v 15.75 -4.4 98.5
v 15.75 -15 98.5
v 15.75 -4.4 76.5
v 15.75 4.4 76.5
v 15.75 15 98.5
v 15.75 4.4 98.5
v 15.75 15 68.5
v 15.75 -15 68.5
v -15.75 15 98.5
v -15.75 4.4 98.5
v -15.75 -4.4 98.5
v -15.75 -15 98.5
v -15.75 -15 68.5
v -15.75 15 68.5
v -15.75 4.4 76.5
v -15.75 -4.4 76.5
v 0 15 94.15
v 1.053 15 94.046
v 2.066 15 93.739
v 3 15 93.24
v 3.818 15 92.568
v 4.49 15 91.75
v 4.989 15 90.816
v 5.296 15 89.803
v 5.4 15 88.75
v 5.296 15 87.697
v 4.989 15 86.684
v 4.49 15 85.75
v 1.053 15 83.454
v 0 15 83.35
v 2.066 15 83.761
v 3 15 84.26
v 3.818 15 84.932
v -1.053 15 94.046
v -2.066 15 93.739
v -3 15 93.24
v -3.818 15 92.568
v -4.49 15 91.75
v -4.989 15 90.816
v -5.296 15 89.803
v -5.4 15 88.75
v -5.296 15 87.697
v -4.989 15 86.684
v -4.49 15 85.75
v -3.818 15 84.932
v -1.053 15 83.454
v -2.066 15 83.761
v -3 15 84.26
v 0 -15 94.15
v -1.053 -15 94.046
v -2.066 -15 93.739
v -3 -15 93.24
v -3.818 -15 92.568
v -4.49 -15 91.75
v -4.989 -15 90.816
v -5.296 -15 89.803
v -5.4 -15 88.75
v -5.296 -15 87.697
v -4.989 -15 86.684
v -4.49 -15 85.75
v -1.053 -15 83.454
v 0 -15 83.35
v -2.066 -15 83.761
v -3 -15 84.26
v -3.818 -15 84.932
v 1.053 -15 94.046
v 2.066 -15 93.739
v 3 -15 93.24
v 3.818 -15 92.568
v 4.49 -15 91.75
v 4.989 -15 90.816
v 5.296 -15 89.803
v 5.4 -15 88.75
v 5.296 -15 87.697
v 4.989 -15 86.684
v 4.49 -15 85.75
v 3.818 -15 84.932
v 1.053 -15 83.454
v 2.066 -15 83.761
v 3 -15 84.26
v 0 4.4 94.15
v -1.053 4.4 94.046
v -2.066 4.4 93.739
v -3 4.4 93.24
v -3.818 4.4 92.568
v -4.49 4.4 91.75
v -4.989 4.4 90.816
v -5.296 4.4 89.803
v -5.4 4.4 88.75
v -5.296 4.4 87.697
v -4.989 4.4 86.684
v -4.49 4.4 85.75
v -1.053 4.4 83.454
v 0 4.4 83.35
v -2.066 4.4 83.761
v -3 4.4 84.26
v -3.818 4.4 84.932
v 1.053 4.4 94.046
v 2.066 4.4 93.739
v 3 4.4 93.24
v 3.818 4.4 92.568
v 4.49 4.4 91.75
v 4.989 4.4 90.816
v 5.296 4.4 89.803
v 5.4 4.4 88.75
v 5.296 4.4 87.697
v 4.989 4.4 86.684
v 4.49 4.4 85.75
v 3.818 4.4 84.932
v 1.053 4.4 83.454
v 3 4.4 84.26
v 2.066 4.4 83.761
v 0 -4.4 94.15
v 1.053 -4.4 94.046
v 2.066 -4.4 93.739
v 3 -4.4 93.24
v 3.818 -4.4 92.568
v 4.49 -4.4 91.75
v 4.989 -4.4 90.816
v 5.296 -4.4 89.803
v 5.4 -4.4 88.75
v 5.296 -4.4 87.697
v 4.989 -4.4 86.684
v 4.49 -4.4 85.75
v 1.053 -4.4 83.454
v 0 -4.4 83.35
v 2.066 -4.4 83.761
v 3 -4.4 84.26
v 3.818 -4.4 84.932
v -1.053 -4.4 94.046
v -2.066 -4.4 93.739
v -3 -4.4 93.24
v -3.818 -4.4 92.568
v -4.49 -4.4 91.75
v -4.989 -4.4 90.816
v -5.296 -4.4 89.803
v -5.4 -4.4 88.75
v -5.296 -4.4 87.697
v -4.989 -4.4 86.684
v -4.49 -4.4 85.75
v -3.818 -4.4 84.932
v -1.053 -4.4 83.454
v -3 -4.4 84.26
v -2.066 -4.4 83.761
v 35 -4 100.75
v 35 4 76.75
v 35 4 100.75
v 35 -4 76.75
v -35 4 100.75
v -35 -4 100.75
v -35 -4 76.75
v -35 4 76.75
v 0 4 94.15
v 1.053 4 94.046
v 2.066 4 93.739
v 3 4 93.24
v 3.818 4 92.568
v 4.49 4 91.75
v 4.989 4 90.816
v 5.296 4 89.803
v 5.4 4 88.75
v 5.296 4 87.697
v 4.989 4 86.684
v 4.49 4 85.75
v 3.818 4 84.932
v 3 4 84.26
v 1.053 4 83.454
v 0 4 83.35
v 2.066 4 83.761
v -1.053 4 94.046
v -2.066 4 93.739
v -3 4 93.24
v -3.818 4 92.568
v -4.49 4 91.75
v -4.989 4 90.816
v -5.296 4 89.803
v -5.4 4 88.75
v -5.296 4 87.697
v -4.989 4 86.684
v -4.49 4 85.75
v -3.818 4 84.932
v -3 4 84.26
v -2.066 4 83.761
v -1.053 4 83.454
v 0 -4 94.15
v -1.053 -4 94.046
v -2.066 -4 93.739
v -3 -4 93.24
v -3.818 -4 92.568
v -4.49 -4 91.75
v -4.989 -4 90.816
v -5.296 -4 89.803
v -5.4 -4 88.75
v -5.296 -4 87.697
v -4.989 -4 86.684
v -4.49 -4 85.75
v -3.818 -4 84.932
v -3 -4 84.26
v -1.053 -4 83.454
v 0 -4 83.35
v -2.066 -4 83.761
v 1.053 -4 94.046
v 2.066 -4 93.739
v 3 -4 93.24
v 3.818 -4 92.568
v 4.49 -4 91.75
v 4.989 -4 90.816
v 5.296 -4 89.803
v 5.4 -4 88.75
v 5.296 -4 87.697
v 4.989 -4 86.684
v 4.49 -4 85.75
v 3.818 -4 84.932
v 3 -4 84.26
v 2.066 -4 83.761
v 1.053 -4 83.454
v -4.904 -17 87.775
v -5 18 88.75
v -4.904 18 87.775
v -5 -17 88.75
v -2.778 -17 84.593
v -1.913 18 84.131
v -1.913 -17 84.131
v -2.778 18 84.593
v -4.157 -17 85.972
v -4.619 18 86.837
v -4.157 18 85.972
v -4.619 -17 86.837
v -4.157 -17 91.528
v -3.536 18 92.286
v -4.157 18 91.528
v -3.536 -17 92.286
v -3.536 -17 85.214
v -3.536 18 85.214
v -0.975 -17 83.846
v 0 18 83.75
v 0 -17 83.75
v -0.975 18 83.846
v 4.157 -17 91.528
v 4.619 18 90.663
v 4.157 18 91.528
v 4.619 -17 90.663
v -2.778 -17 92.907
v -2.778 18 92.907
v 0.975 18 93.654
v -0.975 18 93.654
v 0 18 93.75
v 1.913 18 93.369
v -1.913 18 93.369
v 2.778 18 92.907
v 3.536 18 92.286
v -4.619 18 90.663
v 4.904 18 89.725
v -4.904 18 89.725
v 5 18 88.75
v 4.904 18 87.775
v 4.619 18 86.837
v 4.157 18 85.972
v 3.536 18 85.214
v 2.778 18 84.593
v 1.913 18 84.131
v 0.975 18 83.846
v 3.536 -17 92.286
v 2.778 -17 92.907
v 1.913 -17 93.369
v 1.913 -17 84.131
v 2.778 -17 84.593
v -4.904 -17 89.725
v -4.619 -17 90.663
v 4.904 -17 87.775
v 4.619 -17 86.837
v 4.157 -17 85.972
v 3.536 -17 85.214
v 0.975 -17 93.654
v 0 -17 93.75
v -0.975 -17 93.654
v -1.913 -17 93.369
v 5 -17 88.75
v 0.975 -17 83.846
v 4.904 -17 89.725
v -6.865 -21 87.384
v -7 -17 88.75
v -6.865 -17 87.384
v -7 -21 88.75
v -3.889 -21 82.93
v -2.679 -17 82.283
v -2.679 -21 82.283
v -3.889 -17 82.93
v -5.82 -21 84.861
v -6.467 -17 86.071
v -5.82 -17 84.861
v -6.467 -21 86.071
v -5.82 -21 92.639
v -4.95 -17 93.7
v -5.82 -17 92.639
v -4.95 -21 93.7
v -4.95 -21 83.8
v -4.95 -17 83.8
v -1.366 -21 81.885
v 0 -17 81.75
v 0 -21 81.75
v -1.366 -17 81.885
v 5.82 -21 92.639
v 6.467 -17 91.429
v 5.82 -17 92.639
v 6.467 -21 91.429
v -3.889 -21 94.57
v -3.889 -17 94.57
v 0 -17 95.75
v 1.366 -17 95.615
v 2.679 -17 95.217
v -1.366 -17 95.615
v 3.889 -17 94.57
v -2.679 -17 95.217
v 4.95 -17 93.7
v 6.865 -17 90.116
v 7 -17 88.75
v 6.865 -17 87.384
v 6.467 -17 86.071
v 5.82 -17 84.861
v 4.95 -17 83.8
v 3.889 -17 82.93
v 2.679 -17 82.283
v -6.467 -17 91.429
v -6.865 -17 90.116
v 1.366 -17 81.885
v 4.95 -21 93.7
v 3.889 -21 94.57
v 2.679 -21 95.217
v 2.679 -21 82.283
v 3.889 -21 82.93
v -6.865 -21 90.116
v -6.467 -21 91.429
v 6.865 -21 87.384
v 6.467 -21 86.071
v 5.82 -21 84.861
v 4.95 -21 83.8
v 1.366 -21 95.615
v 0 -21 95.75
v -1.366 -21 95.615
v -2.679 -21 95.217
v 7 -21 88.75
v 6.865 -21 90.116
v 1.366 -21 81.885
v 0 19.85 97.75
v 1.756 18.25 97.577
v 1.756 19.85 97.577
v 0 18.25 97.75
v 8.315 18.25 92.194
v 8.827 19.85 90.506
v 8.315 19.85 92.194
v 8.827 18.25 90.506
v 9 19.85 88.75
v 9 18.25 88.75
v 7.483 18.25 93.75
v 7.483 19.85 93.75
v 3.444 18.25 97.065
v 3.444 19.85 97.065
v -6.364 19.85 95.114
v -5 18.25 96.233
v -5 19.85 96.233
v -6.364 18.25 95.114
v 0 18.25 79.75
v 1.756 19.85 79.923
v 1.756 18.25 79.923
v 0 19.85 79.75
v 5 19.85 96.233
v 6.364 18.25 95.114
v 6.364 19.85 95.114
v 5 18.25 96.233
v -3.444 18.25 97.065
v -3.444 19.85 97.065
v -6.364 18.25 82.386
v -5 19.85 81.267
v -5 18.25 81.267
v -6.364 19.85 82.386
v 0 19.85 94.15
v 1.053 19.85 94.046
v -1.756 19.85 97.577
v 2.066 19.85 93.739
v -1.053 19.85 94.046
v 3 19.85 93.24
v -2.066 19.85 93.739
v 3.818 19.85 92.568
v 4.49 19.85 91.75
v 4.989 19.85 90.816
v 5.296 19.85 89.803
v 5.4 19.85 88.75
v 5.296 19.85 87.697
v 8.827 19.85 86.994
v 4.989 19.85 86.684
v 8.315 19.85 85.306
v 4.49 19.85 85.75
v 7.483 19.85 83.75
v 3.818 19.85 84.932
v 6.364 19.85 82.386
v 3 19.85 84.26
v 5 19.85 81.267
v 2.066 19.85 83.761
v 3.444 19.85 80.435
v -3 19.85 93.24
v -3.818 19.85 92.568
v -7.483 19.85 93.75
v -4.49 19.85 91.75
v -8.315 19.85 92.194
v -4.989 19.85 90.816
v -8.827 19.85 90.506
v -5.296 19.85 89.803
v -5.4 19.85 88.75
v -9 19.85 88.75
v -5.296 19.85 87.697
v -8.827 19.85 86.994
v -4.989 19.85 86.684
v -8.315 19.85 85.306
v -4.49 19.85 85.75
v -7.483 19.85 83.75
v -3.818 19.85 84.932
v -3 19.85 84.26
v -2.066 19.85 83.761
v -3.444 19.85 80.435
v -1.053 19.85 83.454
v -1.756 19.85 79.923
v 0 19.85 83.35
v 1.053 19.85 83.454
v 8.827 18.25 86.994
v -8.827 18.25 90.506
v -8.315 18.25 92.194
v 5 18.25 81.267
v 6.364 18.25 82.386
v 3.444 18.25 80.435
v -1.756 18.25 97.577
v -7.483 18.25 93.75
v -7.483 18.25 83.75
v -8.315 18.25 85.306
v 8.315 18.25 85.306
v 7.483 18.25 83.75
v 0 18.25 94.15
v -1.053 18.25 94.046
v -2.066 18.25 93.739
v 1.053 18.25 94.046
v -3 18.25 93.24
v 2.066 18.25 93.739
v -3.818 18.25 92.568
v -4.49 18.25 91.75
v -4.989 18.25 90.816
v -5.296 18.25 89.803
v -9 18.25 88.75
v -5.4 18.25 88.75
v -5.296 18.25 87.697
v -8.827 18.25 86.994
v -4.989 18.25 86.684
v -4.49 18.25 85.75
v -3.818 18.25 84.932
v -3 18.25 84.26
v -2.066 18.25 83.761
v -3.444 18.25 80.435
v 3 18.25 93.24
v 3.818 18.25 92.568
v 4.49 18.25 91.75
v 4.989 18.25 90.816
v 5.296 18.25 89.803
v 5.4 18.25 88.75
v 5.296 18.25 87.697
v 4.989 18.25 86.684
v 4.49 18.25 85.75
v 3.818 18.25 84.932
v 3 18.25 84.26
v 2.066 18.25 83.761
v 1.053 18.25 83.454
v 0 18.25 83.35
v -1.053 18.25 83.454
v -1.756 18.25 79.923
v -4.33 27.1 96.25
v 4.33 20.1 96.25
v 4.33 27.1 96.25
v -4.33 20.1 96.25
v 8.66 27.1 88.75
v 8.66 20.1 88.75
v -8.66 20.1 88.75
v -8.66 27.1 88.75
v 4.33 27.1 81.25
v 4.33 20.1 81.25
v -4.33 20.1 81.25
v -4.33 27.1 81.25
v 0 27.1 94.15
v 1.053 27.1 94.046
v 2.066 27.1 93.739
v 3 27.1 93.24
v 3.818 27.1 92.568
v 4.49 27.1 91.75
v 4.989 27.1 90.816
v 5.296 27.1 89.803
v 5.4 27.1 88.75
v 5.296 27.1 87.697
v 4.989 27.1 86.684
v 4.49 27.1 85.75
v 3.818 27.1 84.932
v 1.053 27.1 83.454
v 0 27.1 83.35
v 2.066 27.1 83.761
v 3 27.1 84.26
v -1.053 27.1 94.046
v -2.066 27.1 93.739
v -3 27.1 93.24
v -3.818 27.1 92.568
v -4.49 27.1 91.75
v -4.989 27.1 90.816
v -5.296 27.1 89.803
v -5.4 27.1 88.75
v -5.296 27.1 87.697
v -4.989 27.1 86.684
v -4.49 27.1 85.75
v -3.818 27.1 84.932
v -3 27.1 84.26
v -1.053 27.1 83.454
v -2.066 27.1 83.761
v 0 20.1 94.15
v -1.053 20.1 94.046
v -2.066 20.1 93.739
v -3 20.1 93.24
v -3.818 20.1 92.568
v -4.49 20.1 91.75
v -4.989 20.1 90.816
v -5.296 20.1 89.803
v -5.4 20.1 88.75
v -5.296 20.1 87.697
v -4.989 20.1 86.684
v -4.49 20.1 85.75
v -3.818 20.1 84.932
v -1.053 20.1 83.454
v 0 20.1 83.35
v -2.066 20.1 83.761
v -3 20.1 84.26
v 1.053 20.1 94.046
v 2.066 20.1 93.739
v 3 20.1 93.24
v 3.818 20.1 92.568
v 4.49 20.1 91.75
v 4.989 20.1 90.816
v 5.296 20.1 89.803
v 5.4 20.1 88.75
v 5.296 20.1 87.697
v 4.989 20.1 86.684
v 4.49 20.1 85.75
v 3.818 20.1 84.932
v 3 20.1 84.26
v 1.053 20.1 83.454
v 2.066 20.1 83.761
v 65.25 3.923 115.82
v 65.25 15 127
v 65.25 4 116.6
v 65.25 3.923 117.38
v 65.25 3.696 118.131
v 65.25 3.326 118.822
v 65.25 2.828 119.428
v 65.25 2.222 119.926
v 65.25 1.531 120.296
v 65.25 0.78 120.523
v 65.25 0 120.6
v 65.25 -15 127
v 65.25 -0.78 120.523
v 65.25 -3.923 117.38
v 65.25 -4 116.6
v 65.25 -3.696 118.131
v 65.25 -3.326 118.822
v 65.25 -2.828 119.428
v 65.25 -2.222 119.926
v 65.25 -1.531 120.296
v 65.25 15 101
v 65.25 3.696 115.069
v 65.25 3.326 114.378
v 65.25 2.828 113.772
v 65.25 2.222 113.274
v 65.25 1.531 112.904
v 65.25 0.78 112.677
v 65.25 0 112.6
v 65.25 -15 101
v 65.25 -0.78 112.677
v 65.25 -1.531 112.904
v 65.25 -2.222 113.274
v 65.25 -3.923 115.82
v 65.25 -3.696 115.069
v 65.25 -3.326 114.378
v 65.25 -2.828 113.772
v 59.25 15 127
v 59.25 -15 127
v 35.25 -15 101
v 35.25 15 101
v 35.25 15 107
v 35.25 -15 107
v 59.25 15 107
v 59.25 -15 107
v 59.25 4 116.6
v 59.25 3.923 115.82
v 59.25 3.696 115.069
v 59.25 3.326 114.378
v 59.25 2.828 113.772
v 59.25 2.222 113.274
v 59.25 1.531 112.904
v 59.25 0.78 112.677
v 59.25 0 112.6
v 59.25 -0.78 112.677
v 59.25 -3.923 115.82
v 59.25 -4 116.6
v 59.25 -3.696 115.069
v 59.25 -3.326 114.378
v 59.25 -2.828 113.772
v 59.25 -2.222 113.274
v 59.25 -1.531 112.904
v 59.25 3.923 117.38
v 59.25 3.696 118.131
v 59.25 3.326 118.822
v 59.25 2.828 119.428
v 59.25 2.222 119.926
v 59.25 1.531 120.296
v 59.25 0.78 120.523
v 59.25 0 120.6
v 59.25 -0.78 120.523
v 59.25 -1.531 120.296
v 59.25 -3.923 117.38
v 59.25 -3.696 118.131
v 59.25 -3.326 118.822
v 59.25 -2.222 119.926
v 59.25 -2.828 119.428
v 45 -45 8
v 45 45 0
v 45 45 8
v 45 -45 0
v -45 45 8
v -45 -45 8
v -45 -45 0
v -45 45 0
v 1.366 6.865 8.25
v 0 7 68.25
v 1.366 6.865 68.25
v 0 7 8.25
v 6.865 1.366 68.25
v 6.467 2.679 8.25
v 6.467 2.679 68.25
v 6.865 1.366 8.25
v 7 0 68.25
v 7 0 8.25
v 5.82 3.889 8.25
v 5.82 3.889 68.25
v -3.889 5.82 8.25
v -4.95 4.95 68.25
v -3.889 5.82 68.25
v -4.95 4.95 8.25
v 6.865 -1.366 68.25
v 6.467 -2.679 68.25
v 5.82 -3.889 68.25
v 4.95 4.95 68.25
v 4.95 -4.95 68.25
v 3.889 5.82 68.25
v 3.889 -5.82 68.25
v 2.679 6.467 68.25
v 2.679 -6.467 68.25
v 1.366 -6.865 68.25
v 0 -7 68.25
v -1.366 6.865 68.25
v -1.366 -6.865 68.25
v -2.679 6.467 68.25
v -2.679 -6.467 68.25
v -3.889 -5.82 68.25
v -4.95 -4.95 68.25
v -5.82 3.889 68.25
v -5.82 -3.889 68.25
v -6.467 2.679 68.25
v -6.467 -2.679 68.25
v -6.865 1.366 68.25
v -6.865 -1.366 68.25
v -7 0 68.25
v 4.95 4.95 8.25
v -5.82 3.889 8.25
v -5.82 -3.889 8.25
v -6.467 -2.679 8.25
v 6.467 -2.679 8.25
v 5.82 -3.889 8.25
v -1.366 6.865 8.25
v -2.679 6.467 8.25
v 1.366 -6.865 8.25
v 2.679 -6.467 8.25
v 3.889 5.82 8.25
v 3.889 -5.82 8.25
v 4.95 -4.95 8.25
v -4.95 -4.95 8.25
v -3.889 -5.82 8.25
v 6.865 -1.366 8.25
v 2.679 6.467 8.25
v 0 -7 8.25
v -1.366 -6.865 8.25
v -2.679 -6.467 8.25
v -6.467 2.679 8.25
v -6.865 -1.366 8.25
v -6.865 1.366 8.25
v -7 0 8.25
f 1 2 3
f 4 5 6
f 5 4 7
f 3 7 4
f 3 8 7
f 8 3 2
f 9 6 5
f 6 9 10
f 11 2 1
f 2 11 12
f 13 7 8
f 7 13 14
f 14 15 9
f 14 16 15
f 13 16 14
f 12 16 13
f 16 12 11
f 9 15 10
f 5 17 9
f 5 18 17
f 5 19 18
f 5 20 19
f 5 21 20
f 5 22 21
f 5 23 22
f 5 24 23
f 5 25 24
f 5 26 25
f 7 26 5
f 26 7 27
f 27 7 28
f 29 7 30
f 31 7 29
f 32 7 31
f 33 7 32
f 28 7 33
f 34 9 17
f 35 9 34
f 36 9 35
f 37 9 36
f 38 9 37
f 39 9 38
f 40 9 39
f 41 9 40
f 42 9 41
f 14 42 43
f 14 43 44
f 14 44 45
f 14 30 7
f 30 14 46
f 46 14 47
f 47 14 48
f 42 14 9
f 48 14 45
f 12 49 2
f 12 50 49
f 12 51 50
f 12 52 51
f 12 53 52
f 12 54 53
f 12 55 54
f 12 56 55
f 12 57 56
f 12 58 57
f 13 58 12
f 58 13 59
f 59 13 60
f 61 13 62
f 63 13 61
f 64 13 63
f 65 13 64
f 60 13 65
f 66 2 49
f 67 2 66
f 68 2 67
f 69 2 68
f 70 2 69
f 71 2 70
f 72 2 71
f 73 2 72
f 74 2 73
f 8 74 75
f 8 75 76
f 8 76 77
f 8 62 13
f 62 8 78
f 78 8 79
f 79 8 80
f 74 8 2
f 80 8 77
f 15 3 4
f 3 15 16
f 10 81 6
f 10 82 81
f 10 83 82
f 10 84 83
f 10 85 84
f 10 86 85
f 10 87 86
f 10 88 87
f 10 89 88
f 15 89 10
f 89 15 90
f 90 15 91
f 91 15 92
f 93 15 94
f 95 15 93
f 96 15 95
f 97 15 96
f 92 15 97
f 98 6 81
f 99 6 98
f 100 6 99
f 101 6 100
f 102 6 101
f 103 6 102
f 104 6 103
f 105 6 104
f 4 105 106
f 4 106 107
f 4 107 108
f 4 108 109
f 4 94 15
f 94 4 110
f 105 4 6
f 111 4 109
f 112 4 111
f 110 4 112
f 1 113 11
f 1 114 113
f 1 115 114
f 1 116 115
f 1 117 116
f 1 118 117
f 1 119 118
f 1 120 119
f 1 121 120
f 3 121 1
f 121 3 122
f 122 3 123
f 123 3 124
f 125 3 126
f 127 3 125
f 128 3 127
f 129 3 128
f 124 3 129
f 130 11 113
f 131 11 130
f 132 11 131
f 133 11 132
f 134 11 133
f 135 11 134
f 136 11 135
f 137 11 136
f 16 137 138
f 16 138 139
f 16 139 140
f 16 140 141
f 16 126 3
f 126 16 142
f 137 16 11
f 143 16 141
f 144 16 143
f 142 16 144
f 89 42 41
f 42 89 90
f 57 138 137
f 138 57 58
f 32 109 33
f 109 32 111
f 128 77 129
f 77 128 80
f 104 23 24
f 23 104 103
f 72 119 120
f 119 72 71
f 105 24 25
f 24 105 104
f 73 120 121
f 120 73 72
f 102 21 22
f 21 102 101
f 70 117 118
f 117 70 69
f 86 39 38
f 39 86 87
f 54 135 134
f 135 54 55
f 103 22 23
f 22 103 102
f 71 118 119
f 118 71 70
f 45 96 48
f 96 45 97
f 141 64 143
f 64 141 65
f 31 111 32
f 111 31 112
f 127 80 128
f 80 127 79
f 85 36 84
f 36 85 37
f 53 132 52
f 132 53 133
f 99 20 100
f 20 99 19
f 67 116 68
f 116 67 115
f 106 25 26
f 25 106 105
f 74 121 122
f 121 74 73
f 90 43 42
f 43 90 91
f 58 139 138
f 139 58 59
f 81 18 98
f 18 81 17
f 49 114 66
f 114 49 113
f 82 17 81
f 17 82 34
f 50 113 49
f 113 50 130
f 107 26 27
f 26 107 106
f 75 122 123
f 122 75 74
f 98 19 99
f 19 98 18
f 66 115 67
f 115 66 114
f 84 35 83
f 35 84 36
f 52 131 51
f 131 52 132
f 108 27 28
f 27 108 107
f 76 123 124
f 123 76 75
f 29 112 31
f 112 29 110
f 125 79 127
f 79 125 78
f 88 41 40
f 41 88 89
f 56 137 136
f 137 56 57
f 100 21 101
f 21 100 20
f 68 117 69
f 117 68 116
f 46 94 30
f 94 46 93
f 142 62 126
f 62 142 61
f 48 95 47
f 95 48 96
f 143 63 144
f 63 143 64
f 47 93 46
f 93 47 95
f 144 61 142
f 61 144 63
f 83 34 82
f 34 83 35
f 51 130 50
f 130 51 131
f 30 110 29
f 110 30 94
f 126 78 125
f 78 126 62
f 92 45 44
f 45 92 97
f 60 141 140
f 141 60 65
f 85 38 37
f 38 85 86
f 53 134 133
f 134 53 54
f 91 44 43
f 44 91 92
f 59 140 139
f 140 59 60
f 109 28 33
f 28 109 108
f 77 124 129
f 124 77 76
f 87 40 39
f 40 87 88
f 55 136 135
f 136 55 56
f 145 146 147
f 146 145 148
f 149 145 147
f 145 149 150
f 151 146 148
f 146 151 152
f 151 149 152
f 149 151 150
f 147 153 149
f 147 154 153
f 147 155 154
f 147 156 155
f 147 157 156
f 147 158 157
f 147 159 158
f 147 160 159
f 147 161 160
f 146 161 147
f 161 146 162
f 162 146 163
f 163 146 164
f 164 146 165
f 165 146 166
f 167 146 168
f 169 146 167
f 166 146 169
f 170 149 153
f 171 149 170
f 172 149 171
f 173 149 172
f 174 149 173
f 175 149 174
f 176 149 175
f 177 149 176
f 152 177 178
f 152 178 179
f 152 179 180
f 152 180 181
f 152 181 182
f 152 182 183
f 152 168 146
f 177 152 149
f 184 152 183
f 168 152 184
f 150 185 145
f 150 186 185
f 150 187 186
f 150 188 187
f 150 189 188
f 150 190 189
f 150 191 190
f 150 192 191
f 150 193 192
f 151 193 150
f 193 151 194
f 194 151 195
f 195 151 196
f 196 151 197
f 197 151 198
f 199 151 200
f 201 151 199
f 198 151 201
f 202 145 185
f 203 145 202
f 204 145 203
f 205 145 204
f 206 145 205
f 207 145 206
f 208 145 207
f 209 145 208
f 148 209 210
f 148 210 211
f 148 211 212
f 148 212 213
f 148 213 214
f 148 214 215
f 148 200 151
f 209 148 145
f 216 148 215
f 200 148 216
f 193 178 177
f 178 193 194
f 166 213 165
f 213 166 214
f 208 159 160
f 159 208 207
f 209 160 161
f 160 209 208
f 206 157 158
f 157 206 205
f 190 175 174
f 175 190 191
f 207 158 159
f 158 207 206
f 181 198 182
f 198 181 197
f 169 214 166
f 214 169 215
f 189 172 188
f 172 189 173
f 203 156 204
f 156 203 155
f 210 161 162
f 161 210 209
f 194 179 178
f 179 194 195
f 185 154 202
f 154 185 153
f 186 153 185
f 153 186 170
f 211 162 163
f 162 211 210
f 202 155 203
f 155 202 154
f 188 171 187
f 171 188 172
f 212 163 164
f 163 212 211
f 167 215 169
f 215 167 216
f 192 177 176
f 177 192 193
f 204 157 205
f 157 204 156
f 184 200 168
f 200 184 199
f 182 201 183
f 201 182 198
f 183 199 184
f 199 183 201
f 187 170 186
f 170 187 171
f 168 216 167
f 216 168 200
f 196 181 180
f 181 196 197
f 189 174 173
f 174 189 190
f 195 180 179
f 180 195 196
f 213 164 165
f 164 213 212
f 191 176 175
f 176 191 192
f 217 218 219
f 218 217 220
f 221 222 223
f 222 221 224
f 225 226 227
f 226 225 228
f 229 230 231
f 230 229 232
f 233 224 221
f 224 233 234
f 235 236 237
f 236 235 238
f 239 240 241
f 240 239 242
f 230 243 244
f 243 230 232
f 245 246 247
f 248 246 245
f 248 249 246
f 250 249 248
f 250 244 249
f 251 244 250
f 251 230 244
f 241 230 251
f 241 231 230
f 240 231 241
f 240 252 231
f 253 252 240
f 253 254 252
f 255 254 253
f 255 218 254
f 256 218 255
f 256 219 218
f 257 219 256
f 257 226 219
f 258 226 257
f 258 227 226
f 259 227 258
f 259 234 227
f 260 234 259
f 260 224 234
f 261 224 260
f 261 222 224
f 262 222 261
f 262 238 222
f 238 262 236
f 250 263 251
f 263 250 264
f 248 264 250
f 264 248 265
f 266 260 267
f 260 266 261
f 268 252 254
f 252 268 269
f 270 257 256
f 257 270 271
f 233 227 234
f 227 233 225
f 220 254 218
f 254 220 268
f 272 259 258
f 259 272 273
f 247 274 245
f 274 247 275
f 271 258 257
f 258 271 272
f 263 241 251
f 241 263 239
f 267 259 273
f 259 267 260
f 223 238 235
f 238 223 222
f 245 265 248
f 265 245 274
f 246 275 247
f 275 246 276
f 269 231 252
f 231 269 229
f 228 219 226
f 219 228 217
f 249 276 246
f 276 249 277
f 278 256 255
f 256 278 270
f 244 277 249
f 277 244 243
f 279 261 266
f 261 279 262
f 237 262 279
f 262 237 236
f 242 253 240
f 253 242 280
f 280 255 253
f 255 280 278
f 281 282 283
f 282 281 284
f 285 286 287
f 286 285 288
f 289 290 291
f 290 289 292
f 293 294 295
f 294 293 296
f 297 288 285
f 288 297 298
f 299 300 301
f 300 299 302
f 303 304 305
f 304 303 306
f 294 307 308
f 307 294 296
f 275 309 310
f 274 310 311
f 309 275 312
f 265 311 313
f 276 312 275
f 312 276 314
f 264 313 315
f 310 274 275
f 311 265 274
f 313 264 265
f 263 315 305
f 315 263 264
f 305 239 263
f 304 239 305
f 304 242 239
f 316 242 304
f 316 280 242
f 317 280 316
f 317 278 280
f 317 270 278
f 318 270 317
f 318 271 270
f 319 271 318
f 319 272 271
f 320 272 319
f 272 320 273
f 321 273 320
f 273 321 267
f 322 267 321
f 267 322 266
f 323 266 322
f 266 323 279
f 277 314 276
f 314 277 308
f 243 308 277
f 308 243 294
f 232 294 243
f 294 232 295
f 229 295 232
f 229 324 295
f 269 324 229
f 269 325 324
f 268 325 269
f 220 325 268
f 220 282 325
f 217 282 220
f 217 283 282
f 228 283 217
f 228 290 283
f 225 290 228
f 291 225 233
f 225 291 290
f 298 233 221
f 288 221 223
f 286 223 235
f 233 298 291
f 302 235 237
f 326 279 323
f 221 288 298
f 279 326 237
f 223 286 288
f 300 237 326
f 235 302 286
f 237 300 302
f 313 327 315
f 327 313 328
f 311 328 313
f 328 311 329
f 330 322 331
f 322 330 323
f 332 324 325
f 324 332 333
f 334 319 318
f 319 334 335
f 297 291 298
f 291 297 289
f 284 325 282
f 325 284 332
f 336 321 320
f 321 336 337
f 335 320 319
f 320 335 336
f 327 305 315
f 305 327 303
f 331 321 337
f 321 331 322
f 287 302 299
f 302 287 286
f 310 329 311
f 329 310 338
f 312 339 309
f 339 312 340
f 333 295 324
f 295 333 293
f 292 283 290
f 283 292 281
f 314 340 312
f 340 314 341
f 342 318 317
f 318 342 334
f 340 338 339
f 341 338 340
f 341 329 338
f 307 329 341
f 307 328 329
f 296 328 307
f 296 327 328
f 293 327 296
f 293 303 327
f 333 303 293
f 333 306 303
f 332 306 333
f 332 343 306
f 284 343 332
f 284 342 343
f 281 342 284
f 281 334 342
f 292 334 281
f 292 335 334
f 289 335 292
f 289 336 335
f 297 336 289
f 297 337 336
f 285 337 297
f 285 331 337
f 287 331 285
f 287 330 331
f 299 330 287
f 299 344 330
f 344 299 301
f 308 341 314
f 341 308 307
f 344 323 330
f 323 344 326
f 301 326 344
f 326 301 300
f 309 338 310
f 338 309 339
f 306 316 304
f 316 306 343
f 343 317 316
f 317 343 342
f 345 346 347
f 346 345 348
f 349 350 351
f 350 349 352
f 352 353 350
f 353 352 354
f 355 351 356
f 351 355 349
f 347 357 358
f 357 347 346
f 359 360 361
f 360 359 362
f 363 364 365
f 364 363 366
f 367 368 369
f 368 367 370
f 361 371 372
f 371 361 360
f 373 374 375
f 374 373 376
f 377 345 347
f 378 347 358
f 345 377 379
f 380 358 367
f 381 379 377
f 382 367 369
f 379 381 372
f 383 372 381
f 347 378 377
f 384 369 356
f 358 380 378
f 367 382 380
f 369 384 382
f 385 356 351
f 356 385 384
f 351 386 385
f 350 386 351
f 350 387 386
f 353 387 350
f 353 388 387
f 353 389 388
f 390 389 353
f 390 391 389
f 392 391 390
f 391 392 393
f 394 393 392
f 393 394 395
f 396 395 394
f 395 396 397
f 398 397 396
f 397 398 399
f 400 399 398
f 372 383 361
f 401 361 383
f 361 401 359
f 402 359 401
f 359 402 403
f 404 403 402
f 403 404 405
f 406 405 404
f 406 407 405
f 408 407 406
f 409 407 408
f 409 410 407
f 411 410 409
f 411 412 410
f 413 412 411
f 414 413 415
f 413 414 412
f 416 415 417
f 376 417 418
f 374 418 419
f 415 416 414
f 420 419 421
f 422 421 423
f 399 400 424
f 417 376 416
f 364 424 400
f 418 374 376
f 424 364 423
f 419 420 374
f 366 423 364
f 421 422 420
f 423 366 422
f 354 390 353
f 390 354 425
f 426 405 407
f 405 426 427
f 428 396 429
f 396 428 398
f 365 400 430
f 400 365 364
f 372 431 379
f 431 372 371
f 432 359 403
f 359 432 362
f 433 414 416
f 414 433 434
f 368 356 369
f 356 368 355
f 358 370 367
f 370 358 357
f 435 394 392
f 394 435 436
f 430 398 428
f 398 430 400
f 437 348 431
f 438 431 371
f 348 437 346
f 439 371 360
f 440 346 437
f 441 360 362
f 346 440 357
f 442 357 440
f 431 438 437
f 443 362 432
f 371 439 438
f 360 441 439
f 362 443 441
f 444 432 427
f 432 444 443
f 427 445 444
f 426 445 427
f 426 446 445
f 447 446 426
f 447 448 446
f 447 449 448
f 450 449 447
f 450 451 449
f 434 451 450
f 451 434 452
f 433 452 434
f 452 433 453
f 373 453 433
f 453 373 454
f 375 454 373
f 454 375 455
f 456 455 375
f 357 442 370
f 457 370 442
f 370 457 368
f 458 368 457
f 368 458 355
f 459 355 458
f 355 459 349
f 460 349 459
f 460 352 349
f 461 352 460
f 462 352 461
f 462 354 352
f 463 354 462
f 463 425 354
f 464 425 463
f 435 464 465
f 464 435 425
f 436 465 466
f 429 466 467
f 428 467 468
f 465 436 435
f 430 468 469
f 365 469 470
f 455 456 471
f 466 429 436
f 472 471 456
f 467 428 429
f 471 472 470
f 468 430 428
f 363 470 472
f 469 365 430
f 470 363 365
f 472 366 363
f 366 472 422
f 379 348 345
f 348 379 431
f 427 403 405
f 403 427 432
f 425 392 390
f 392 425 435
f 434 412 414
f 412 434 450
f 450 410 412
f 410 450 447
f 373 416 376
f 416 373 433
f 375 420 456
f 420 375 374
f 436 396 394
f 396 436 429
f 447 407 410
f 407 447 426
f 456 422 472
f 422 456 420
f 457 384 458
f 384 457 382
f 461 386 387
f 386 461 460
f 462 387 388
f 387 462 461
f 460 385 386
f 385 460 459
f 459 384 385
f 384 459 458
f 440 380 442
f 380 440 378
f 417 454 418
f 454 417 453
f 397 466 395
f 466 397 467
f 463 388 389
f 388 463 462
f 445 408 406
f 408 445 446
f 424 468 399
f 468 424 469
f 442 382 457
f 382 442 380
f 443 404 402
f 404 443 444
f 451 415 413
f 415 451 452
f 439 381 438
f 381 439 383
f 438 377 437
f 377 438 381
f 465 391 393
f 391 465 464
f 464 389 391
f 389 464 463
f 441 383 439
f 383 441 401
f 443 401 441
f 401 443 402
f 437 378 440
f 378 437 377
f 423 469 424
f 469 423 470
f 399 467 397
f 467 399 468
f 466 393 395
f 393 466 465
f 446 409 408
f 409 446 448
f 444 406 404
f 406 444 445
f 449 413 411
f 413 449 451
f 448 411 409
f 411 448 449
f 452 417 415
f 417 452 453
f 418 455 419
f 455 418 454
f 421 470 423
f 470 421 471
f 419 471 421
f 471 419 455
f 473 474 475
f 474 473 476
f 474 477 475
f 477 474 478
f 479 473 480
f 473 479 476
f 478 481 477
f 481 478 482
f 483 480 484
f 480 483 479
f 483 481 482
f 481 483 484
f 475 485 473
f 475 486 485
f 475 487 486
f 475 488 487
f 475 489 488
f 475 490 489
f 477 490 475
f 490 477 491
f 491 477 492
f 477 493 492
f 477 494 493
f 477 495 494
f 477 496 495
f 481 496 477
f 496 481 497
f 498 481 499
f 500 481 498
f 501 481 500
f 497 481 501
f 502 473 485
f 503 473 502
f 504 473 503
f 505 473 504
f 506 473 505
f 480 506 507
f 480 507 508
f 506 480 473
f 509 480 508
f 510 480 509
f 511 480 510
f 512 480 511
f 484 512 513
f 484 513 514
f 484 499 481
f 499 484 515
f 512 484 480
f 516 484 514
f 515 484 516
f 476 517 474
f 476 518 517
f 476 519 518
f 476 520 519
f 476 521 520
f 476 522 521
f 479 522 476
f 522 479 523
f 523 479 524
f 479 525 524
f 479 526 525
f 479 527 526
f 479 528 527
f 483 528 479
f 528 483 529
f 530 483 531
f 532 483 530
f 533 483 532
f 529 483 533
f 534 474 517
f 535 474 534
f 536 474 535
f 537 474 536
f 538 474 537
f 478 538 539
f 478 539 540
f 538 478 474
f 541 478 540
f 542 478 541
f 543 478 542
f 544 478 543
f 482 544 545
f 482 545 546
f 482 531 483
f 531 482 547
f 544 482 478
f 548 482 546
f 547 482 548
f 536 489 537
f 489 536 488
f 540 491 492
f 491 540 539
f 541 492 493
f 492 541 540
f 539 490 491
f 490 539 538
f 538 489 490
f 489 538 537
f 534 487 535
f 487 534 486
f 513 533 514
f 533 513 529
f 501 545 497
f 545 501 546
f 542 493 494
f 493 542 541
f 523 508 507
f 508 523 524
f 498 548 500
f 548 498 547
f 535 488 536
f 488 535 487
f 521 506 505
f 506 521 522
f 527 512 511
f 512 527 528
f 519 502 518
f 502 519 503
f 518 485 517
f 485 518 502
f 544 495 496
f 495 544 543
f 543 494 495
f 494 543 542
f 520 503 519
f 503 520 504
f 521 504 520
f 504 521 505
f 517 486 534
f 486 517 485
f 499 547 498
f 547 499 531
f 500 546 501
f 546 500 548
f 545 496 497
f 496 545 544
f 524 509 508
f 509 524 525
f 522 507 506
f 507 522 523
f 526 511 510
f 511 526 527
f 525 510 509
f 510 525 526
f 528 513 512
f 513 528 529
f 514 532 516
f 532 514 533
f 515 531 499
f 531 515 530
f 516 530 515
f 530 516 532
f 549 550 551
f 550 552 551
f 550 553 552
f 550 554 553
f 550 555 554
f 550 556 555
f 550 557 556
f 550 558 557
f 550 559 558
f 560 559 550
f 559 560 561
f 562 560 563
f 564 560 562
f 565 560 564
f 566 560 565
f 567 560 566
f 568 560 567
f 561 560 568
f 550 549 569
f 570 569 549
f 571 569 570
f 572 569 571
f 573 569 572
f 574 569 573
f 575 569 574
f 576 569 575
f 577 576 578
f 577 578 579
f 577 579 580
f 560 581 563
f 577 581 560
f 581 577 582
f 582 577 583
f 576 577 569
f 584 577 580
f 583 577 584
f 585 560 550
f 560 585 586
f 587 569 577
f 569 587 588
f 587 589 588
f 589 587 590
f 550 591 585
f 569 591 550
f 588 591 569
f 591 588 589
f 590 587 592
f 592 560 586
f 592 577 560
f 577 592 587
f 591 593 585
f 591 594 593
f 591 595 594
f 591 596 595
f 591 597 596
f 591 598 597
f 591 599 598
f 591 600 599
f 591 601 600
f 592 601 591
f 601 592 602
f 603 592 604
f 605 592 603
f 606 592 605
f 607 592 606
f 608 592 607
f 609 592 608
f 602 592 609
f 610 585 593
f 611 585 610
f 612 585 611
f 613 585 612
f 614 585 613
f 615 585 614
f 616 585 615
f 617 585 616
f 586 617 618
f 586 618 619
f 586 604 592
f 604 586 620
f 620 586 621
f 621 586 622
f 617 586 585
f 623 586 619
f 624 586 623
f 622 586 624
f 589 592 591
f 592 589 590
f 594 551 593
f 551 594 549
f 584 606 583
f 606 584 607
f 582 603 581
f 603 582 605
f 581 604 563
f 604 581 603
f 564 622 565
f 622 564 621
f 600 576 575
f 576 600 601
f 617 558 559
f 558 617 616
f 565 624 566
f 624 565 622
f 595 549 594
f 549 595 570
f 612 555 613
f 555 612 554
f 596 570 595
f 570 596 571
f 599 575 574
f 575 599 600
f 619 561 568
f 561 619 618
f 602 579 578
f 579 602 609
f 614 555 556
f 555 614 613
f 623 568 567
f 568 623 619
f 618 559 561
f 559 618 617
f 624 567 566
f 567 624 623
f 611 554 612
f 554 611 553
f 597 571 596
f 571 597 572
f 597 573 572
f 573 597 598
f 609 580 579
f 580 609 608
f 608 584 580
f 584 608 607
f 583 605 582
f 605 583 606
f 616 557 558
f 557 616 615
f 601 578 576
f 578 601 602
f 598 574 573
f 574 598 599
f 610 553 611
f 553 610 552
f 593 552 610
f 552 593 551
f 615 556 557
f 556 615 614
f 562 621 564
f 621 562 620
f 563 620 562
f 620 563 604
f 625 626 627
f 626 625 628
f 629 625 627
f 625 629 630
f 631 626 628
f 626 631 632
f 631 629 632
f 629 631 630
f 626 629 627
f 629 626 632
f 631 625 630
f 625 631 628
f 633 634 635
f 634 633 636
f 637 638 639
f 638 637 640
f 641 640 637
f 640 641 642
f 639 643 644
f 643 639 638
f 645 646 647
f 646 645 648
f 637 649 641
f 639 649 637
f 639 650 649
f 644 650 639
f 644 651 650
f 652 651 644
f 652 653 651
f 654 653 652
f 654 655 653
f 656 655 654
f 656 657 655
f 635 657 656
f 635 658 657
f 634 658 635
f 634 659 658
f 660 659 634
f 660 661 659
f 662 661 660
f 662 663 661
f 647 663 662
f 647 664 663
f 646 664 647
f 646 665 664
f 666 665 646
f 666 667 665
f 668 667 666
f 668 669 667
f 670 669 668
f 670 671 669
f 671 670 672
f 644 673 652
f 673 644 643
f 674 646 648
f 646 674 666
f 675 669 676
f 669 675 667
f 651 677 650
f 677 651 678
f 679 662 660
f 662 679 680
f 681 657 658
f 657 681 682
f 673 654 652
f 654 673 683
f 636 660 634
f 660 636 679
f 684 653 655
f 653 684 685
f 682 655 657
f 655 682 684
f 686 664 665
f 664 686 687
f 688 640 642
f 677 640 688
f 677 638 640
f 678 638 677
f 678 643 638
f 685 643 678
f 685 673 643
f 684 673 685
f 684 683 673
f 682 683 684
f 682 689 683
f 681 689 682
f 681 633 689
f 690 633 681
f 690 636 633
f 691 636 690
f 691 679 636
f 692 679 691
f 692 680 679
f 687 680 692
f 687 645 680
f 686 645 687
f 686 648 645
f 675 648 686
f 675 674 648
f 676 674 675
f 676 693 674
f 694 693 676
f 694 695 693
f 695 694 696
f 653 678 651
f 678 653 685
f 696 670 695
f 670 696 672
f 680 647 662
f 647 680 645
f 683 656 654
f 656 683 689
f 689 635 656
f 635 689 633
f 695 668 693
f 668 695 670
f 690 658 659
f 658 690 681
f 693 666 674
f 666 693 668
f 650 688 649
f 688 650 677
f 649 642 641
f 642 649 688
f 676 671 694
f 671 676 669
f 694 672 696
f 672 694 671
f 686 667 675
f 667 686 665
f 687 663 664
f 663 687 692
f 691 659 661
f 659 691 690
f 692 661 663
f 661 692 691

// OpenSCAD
$fn = 32;

// ------------------------------------------------------------------------
// Lamp arm: column d14 x 60 mm, arm 70 mm
// Every part is its own module, assembly() places every instance.
// ------------------------------------------------------------------------

// --- part 1 ---
module lamp_base() {
  difference() {
    translate([-45, -45, 0]) cube([90, 90, 8]);
  }
}

// --- part 2 ---
module lamp_column() {
  cylinder(h = 60, d = 14);
}

// --- part 3 ---
module head_fork() {
  difference() {
    translate([-15.75, -15, 0]) cube([31.5, 30, 30]);
    translate([-16.75, -4.4, 8]) cube([33.5, 8.8, 23]);
    translate([0, 0, 20.25]) rotate([90, 0, 0]) cylinder(h = 32, d = 10.8, center = true);
  }
}

// --- part 4 ---
module lamp_arm() {
  difference() {
    translate([-35, -4, 0]) cube([70, 8, 24]);
    translate([0, 0, 12]) rotate([90, 0, 0]) cylinder(h = 10, d = 10.8, center = true);
  }
}

// --- part 5 ---
module arm_pin() {
  rotate([0, 90, 0]) cylinder(h = 36, d = 10, center = true);
  translate([-21, 0, 0]) rotate([0, 90, 0]) cylinder(h = 4, d = 14);
}

// --- part 6 ---
module arm_washer() {
  difference() {
      translate([0, 0, 0]) cylinder(h = 1.6, d = 18);
      translate([0, 0, -1]) cylinder(h = 3.6, d = 10.8);
    }
}

// --- part 7 ---
module arm_nut() {
  difference() {
    linear_extrude(height = 7) polygon(points = [[8.66, 0], [4.33, 7.5], [-4.33, 7.5], [-8.66, 0], [-4.33, -7.5], [4.33, -7.5]]);
    translate([0, 0, -1]) cylinder(h = 9, d = 10.8);
  }
}

// --- part 8 ---
module shade_bracket() {
  difference() {
    translate([-15, -15, 0]) cube([30, 30, 26]);
    translate([-16, -16, 6]) cube([25, 32, 21]);
    translate([12, 0, 15.6]) rotate([0, 90, 0]) cylinder(h = 8, d = 8, center = true);
  }
}

// --- assembly ---
module assembly() {
  color([0.80, 0.24, 0.20]) translate([0, 0, 0]) rotate([0, 0, 0]) lamp_base();
  color([0.20, 0.45, 0.75]) translate([0, 0, 8.25]) rotate([0, 0, 0]) lamp_column();
  color([0.25, 0.62, 0.32]) translate([0, 0, 68.5]) rotate([0, 0, 0]) head_fork();
  color([0.92, 0.70, 0.18]) translate([0, 0, 76.75]) rotate([0, 0, 0]) lamp_arm();
  color([0.58, 0.35, 0.70]) translate([0, 0, 88.75]) rotate([0, 0, 90]) arm_pin();
  color([0.16, 0.66, 0.66]) translate([0, 19.85, 88.75]) rotate([90, 0, 0]) arm_washer();
  color([0.85, 0.48, 0.18]) translate([0, 27.1, 88.75]) rotate([90, 0, 0]) arm_nut();
  color([0.55, 0.60, 0.65]) translate([50.25, 0, 101]) rotate([0, 0, 0]) shade_bracket();
}

assembly();
